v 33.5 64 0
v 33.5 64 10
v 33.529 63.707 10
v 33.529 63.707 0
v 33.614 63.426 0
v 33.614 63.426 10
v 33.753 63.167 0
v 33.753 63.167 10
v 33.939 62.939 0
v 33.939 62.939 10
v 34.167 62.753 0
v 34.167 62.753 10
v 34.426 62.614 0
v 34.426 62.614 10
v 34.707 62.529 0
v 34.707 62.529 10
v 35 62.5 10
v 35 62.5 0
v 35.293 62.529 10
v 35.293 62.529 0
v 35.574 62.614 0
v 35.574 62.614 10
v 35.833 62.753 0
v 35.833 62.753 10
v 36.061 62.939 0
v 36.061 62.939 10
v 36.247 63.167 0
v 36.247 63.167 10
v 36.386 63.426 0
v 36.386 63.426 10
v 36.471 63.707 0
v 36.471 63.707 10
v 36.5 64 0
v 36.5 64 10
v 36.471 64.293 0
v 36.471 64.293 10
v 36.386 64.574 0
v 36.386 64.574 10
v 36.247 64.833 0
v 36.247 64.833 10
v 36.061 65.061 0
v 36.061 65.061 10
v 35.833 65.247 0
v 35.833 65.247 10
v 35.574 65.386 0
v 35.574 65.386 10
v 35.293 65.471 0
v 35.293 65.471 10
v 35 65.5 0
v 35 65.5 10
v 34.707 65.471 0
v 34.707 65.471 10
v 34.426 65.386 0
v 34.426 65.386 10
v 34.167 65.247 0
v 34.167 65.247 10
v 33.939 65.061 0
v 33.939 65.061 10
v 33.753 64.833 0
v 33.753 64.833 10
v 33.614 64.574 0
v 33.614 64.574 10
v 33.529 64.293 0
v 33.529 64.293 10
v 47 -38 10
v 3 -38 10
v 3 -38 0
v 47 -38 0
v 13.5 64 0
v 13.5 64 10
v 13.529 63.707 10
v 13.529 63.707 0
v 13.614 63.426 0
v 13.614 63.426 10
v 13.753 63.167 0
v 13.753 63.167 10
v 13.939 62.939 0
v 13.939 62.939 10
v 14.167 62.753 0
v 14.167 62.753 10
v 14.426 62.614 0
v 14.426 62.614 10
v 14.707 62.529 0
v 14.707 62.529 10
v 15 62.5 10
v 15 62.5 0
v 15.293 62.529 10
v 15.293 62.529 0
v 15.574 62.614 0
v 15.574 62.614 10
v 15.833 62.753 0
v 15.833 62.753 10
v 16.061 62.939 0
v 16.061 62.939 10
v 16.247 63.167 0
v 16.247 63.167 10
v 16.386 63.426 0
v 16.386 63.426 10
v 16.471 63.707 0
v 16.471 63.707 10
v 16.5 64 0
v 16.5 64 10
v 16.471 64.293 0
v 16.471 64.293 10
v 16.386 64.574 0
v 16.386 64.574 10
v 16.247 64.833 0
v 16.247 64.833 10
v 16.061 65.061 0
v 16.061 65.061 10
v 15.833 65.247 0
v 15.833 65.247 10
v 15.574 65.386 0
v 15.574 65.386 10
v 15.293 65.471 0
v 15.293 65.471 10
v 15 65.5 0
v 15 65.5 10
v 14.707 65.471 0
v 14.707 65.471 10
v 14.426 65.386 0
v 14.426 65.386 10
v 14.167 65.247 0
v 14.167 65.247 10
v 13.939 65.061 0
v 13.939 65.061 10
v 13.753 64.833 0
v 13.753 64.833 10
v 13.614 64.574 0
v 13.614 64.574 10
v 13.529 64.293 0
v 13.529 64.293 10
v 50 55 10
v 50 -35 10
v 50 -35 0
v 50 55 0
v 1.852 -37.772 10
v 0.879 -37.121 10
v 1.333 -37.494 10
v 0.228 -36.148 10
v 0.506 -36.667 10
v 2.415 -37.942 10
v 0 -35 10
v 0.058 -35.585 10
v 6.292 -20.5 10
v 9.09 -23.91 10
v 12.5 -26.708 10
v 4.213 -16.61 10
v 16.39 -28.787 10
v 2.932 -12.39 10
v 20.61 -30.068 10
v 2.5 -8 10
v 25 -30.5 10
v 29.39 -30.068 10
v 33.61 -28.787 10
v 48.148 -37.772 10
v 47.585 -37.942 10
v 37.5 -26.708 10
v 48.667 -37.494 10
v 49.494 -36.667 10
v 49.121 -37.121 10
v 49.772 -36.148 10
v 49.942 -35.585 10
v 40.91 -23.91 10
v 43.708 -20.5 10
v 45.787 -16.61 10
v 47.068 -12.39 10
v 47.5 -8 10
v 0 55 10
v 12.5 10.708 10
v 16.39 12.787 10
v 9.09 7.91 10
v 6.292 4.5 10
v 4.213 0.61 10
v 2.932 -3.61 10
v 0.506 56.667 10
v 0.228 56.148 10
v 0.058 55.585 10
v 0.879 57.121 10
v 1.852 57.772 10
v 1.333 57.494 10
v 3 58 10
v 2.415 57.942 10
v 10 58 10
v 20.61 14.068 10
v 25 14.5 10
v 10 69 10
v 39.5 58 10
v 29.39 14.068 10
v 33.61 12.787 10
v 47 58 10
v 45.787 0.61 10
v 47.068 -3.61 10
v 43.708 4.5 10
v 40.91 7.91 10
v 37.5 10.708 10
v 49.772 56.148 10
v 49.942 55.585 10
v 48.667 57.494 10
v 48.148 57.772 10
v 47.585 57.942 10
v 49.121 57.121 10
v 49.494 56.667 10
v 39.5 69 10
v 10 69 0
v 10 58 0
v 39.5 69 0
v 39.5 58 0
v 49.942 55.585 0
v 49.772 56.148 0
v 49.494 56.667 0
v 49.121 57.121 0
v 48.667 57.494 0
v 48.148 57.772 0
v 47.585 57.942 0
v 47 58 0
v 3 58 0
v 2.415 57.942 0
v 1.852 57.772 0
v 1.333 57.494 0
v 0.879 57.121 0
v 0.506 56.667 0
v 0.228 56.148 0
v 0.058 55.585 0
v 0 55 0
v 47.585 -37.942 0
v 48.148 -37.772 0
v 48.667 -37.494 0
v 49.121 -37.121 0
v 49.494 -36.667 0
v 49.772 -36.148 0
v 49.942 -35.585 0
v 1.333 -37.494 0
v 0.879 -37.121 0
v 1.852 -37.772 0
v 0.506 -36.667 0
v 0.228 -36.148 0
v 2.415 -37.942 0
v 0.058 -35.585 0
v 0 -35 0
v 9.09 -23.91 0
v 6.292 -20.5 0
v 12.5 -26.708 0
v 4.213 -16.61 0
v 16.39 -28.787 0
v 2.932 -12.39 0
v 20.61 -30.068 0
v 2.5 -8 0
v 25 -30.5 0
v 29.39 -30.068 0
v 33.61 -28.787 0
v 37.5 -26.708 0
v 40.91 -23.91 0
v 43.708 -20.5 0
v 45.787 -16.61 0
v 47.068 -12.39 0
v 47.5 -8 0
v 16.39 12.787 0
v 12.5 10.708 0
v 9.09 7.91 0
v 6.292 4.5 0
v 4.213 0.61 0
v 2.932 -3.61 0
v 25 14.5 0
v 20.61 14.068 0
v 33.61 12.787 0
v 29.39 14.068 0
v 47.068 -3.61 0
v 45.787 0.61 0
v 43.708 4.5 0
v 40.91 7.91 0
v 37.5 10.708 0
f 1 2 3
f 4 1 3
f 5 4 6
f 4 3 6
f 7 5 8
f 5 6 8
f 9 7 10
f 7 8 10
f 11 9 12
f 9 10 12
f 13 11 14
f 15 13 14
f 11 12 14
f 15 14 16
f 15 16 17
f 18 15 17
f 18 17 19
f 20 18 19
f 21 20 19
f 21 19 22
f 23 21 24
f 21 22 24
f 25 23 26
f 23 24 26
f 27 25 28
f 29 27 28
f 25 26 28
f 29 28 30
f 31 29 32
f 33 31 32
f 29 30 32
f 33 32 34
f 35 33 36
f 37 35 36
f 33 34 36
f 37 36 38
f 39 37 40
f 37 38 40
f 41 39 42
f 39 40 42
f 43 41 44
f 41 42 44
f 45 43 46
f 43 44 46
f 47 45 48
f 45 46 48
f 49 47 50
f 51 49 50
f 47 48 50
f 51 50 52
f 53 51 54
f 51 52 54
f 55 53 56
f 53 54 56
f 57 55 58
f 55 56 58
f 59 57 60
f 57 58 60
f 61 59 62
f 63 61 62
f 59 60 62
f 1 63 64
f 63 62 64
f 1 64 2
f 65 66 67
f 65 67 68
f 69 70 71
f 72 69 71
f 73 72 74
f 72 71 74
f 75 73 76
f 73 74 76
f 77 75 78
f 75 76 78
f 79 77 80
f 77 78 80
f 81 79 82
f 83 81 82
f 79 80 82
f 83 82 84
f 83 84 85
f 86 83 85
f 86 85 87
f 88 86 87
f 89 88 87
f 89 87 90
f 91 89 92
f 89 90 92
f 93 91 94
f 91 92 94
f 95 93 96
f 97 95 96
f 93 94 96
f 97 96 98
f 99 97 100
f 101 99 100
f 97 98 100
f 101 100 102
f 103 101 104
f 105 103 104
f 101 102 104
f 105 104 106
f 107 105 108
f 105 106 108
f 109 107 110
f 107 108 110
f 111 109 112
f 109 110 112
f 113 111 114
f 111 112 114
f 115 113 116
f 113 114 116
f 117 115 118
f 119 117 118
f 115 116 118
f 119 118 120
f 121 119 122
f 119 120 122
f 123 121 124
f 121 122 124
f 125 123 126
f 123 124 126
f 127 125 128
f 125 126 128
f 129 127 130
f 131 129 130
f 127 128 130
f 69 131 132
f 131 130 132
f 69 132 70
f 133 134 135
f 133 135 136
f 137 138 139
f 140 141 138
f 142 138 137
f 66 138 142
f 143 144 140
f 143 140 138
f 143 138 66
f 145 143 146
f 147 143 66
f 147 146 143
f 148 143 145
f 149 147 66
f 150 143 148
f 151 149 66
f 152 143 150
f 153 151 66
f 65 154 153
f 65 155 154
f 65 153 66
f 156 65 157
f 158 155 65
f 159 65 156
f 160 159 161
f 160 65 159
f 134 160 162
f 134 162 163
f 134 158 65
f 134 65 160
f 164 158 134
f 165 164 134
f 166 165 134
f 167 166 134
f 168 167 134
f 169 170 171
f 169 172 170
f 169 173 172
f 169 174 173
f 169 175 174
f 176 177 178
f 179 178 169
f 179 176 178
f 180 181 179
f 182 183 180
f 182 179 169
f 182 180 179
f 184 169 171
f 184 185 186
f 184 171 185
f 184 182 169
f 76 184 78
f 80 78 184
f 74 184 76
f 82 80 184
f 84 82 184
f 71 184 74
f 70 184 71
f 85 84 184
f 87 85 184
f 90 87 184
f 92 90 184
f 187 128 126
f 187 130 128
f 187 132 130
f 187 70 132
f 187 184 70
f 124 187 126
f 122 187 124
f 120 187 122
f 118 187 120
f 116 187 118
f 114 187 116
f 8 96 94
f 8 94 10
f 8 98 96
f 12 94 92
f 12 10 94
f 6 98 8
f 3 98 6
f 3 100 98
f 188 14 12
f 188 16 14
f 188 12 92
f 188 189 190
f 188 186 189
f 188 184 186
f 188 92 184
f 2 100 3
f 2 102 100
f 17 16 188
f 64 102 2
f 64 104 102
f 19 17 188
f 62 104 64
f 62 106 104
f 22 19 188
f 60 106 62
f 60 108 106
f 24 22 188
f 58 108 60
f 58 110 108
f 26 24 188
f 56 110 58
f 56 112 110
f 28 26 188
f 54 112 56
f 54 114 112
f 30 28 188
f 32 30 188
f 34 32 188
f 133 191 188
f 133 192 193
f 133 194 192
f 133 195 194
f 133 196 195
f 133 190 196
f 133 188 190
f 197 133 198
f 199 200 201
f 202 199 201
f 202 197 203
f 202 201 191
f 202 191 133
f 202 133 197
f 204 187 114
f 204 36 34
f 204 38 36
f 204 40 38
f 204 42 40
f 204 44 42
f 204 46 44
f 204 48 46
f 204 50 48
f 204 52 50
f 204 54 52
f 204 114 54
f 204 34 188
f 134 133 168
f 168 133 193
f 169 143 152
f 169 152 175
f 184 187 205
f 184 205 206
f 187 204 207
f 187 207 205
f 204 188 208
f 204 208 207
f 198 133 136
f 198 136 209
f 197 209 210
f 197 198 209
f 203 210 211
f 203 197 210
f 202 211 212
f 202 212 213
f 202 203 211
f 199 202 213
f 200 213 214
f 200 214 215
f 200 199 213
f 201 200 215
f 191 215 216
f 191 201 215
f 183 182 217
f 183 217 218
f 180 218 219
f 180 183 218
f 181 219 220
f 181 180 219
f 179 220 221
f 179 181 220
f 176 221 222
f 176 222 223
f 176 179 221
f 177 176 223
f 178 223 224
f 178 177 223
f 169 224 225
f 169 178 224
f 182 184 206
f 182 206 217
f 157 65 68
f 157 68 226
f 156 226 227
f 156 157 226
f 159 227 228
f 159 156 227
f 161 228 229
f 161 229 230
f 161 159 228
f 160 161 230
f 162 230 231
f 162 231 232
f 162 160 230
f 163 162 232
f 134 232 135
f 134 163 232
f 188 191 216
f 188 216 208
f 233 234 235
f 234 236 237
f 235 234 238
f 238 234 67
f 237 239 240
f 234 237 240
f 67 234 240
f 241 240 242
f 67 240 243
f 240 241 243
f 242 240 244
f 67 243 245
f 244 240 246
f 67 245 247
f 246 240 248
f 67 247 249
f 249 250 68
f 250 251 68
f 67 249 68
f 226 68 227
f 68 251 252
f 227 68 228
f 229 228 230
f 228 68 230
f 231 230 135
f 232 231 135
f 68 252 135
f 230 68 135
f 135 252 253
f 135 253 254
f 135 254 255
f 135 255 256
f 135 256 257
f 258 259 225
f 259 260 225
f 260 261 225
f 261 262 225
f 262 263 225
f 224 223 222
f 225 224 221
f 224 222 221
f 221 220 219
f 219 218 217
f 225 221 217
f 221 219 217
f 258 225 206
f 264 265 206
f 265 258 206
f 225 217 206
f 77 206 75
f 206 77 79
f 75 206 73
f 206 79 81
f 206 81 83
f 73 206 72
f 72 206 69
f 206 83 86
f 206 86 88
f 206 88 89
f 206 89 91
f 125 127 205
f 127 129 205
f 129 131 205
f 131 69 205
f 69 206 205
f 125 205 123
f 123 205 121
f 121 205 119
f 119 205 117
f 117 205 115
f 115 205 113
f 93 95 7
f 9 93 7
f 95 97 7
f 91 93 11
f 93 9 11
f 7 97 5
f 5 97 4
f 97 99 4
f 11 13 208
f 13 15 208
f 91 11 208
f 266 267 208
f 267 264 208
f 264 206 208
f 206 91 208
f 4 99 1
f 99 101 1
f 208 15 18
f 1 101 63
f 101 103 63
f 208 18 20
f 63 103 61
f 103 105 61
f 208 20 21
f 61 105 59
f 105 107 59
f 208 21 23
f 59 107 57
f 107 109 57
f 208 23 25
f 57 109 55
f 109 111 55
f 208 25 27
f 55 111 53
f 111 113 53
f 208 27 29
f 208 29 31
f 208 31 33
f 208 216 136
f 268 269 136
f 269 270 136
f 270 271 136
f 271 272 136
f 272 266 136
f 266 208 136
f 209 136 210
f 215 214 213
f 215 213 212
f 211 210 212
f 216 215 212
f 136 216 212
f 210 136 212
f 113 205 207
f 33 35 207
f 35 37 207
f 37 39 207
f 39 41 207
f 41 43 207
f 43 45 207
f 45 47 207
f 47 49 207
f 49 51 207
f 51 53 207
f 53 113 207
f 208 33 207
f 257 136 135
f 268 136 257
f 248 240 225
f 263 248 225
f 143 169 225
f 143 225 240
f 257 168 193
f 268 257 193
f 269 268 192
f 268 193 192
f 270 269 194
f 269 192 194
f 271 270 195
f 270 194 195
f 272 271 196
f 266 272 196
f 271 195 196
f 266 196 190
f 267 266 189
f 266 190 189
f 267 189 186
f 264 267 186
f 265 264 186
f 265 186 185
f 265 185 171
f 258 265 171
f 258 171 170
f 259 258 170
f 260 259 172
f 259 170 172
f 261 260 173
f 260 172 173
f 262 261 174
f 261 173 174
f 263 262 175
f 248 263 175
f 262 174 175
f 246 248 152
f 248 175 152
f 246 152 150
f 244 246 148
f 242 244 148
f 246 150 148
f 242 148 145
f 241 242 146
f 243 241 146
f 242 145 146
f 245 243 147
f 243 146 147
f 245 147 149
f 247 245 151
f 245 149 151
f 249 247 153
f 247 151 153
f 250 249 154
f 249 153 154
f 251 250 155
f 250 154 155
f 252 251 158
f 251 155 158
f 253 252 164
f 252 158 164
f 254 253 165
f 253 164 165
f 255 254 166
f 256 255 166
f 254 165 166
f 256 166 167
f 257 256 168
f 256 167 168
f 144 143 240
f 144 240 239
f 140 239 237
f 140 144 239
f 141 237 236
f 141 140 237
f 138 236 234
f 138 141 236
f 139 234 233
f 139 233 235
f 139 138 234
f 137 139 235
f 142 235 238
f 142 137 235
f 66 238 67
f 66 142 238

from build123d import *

# Parameters (mm, degrees)
IZIM1_R                     = 1.5
IZIM1_R_2                   = 22.5
Y_KSEKLIK_EKSTR_ZYON1_DEPTH = 10


with BuildPart() as part:
    # Çizim1 → Yükseklik-Ekstrüzyon1 (new body)
    with BuildSketch(Plane.XY.offset(10)):
        with BuildLine():
            Line((3, -38), (47, -38))
            ThreePointArc((47, -38), (49.121320344, -37.121320344), (50, -35))
            Line((50, -35), (50, 55))
            ThreePointArc((50, 55), (49.121320344, 57.121320344), (47, 58))
            Line((47, 58), (39.5, 58))
            Line((39.5, 58), (39.5, 69))
            Line((39.5, 69), (10, 69))
            Line((10, 69), (10, 58))
            Line((10, 58), (3, 58))
            ThreePointArc((3, 58), (0.878679656, 57.121320344), (0, 55))
            Line((0, 55), (0, -35))
            ThreePointArc((0, -35), (0.878679656, -37.121320344), (3, -38))
        make_face()
        with Locations(Location((15, 64, 0), (0, 0, 180))):
            Circle(IZIM1_R, mode=Mode.SUBTRACT)
        with Locations((25, -8)):
            Circle(IZIM1_R_2, mode=Mode.SUBTRACT)
        with Locations(Location((35, 64, 0), (0, 0, 180))):
            Circle(IZIM1_R, mode=Mode.SUBTRACT)
    extrude(amount=-Y_KSEKLIK_EKSTR_ZYON1_DEPTH)


solid = part.part
